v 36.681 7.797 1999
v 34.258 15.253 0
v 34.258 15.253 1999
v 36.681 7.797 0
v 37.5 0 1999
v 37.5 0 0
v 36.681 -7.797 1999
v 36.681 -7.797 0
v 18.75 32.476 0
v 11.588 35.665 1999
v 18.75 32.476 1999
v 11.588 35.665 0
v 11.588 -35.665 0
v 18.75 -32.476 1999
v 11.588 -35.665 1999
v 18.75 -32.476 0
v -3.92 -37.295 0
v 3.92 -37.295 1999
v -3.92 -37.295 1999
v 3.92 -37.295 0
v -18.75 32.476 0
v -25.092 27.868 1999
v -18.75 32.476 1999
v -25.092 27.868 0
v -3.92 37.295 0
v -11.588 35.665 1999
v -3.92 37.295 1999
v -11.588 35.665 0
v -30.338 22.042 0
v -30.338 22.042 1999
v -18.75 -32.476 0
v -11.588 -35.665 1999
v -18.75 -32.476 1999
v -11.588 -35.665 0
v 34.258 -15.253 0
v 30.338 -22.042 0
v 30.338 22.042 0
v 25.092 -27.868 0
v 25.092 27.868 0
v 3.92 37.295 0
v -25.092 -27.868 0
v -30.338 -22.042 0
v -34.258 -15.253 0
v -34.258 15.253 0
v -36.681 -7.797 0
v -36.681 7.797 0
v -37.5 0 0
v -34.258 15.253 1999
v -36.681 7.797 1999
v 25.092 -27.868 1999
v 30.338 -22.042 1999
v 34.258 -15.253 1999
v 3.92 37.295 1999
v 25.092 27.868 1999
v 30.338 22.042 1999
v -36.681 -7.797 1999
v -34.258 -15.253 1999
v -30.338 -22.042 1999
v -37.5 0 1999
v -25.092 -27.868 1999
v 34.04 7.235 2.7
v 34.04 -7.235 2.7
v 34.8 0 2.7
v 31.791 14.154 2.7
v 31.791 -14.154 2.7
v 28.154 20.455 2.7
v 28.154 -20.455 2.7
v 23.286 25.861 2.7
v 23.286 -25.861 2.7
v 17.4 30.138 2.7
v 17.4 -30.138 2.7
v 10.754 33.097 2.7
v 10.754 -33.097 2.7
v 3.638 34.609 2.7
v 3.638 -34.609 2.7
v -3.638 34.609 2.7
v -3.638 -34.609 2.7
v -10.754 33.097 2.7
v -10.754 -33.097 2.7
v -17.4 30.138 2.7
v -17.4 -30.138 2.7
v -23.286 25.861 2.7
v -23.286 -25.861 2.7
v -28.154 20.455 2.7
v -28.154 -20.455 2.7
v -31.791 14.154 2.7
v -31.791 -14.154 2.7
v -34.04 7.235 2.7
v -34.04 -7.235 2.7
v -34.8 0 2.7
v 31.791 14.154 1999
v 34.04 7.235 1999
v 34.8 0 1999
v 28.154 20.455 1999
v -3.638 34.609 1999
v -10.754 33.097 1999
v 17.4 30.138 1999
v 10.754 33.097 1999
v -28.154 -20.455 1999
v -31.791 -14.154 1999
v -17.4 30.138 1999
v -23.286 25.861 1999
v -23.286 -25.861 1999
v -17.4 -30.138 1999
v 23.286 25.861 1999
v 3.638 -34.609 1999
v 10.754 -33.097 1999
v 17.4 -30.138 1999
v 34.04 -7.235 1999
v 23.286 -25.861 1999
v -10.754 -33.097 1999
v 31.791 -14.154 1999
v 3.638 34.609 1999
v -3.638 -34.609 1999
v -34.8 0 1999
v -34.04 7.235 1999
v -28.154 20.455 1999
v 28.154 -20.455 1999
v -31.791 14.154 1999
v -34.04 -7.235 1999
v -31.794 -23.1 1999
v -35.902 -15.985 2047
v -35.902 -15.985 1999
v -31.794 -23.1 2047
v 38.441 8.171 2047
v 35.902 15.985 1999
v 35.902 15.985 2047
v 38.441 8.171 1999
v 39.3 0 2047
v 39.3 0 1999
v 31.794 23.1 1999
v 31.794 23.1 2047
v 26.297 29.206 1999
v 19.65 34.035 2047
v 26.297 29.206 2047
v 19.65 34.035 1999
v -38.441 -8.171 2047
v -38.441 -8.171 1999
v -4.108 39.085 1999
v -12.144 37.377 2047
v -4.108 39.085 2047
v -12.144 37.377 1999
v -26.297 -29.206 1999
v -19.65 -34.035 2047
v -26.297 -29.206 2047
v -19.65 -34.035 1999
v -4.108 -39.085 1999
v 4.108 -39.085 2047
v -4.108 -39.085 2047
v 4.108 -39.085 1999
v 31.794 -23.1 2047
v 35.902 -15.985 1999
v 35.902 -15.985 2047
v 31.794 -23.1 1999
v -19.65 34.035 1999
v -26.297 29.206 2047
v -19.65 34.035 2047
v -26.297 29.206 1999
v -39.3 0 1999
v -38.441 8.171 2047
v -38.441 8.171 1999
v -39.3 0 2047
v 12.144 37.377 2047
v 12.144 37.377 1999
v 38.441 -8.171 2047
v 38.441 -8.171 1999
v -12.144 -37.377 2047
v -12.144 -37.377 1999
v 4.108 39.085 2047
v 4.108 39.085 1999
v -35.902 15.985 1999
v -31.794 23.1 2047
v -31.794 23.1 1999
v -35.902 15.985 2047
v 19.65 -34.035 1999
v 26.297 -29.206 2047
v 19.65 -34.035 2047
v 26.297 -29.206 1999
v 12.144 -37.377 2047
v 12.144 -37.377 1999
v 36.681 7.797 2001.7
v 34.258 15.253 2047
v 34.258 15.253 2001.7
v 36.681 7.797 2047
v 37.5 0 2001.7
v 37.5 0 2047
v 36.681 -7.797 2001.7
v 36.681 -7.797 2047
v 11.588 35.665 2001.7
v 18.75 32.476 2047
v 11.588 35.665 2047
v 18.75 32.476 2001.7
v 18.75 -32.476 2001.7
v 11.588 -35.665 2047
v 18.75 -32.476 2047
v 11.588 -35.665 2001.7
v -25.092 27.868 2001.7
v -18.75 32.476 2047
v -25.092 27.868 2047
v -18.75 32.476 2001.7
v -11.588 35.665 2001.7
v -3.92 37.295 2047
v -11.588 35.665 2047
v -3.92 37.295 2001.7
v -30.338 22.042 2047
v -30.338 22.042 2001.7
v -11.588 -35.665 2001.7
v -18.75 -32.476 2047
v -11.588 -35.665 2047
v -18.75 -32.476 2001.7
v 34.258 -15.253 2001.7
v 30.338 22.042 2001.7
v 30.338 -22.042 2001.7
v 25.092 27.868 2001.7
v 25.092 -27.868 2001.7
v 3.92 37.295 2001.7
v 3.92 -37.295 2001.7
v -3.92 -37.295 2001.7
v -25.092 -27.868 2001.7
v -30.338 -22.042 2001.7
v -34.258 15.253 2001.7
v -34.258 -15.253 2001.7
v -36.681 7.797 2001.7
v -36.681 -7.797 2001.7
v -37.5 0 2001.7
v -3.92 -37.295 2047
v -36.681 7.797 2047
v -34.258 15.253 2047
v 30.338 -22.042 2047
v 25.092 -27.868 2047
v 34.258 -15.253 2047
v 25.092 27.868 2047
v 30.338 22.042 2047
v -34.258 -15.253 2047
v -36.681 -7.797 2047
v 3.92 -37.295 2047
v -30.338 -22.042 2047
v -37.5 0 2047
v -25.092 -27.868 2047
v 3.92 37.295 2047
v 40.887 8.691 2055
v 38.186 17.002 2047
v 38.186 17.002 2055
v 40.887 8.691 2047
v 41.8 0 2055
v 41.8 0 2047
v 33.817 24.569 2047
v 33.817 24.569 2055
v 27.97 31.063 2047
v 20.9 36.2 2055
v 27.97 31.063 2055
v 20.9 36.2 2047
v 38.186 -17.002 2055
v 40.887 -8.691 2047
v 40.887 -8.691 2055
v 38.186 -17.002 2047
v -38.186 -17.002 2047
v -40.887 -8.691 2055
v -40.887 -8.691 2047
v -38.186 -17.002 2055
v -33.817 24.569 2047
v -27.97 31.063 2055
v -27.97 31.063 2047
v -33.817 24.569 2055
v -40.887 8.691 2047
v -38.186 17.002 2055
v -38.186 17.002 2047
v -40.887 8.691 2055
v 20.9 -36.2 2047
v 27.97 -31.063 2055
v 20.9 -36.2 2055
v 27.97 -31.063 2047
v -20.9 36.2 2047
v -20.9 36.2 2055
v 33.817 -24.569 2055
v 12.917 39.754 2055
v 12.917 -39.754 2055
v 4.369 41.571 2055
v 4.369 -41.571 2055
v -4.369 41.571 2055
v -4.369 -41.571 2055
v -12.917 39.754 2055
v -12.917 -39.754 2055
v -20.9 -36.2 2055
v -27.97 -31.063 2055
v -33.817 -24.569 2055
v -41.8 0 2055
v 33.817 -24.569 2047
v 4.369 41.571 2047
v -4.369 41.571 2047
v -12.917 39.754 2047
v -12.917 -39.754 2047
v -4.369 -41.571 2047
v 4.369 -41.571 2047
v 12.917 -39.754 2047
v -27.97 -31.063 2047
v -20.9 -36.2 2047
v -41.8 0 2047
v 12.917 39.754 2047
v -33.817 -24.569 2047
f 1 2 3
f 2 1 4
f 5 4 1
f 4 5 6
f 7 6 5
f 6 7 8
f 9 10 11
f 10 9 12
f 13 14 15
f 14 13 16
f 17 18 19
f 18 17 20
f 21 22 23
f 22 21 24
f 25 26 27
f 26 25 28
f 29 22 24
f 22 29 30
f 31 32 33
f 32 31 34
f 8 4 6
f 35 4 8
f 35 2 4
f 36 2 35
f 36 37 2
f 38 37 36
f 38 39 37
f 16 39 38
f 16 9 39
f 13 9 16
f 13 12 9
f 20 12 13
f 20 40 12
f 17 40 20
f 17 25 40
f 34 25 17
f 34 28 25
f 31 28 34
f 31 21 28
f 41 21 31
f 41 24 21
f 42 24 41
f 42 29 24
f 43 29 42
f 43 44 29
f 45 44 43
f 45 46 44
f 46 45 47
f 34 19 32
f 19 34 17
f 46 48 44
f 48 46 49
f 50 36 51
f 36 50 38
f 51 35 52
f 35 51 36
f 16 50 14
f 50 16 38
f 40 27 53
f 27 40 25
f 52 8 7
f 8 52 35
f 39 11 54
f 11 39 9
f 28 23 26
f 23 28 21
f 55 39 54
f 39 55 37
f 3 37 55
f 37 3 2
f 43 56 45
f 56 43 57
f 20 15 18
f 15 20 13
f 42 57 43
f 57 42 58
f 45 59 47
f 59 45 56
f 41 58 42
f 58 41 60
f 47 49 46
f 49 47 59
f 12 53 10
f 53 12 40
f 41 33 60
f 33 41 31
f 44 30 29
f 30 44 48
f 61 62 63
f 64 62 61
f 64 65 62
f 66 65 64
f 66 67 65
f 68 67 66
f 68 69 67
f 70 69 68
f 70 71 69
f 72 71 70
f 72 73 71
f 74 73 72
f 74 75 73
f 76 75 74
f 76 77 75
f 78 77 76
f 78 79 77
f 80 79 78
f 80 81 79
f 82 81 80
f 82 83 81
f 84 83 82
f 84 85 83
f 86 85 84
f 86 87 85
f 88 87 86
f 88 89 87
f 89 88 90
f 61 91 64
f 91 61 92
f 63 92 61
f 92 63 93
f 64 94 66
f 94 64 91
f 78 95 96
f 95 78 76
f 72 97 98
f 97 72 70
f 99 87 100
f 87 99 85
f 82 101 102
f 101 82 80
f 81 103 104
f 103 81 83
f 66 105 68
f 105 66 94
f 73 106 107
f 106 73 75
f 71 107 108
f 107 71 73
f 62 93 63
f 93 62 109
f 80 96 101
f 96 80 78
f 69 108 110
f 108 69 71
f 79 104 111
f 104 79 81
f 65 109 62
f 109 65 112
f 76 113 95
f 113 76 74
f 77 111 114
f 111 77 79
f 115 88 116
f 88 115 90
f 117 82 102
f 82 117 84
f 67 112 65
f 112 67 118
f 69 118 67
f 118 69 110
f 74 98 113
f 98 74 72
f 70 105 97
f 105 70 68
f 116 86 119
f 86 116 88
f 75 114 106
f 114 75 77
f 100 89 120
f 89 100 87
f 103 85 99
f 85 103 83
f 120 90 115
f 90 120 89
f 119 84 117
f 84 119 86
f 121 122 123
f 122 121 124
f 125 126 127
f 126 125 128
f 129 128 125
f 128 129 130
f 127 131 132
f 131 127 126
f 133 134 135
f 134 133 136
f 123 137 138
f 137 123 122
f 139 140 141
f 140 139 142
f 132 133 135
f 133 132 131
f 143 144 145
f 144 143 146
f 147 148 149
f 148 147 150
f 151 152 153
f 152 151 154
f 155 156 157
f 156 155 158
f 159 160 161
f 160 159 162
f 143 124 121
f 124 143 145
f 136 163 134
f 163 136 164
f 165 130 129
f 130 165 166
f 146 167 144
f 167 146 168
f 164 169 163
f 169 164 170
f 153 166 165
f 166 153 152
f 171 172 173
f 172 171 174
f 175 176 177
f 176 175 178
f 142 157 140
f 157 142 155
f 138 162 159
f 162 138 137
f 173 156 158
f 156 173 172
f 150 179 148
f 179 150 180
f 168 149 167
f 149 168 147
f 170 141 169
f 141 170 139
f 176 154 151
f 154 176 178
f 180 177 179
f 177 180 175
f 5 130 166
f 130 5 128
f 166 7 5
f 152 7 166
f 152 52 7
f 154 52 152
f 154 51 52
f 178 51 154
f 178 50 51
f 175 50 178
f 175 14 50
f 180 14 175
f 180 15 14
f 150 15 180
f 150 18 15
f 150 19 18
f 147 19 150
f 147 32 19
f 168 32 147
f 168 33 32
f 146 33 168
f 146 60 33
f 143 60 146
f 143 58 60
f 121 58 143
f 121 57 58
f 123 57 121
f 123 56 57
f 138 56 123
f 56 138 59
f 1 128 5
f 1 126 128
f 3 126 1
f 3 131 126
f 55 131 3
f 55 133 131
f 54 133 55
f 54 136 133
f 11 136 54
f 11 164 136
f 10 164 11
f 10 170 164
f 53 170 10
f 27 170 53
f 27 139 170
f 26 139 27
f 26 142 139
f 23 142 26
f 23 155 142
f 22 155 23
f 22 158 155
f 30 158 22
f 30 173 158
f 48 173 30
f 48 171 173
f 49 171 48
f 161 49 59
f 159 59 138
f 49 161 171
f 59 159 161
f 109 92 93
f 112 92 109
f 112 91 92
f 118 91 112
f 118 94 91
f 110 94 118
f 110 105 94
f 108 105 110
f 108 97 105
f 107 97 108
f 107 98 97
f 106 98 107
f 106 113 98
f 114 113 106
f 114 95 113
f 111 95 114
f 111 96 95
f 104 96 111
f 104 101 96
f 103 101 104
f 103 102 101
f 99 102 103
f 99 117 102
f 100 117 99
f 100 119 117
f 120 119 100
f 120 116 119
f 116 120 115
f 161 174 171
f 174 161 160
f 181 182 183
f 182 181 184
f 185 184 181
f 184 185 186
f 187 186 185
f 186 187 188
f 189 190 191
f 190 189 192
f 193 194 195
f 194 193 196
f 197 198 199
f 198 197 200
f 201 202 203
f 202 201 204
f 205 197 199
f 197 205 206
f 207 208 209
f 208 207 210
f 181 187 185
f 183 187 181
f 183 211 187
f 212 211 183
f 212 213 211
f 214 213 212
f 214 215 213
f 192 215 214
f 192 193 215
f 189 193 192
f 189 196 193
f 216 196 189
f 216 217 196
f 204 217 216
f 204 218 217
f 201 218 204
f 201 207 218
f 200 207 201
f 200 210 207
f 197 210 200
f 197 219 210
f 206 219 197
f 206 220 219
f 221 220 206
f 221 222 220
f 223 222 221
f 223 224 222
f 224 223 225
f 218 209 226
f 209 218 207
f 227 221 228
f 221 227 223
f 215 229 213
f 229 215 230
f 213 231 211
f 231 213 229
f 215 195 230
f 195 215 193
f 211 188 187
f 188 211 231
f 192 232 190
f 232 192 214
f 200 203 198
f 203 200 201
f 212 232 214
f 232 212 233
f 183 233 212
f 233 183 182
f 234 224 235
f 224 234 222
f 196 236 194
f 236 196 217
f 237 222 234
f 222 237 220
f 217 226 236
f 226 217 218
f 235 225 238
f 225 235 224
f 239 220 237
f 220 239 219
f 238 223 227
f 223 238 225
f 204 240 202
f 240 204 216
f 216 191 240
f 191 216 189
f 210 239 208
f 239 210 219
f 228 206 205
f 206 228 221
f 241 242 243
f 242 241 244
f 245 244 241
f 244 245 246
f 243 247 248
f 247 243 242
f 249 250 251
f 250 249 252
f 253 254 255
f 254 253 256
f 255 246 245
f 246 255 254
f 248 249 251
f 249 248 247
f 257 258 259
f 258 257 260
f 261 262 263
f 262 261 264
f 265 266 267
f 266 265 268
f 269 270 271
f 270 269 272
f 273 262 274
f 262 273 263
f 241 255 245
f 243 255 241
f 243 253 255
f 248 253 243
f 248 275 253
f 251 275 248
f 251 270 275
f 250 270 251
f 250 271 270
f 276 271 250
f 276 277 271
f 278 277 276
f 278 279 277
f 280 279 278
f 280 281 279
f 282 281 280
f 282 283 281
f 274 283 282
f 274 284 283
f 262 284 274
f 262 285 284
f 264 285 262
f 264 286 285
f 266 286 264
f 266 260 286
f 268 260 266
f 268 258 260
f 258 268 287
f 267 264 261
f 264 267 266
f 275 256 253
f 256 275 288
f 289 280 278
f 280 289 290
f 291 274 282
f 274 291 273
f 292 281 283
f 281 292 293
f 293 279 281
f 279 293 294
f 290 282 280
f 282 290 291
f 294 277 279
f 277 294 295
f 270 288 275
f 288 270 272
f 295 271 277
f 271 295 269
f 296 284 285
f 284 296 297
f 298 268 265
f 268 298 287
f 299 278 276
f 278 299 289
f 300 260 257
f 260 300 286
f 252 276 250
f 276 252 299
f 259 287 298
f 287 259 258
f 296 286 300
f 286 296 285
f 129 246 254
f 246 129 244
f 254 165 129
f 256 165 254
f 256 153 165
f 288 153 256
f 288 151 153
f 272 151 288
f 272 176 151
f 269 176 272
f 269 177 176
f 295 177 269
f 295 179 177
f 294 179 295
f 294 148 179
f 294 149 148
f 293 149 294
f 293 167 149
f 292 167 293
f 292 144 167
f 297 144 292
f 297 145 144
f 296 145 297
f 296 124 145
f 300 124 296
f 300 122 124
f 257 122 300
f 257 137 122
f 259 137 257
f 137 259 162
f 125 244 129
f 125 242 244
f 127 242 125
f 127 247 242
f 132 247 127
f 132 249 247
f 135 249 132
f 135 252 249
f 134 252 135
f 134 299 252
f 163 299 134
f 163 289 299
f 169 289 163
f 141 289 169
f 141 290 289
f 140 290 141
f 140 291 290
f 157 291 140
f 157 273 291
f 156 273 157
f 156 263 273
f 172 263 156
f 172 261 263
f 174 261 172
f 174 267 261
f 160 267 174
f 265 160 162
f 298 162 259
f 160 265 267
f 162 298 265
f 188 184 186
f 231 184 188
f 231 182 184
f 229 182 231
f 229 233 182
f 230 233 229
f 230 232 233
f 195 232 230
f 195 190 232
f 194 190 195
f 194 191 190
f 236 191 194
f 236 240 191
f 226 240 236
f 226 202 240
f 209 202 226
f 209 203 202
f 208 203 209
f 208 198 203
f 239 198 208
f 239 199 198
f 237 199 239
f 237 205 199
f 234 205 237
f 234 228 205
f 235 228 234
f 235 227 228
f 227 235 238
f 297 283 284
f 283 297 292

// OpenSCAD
// Parameters
nominal_diameter_mm = 75; //[40:160:1]
length_mm = 2000; //[500:4000:10]
pipe_od_mm = 75; //[40:160:1]
wall_thickness_mm = 2.7; //[1.5:6:0.1]
fit_socket_length_mm = 55; //[25:120:1]
fit_socket_wall_extra_mm = 1.8; //[0.8:4:0.1]
fit_stop_ring_length_mm = 8; //[3:20:1]
fit_stop_ring_radial_mm = 2.5; //[1:6:0.1]
fit_lead_in_length_mm = 6; //[2:20:1]
overlap_mm = 1; //[0.5:2:0.1]
include_end_fitting = 1; //[0:1:1]

// HT Pipe - complete geometry
module ht_pipe() {
  color([0.85, 0.85, 0.8]) {
    // Pipe body
    difference() {
      cylinder(h=length_mm, r=pipe_od_mm/2, center=false);
      translate([0, 0, wall_thickness_mm])
        cylinder(h=length_mm, r=pipe_od_mm/2 - wall_thickness_mm, center=false);
    }
    
    // End fitting
    if (include_end_fitting) {
      union() {
        // Socket shell
        difference() {
          translate([0, 0, length_mm - overlap_mm])
            cylinder(h=fit_socket_length_mm, r=pipe_od_mm/2 + fit_socket_wall_extra_mm, center=false);
          translate([0, 0, length_mm - overlap_mm + wall_thickness_mm])
            cylinder(h=fit_socket_length_mm, r=pipe_od_mm/2, center=false);
        }
        
        // Stop ring
        translate([0, 0, length_mm + fit_socket_length_mm - fit_stop_ring_length_mm])
          cylinder(h=fit_stop_ring_length_mm, r=pipe_od_mm/2 + fit_socket_wall_extra_mm + fit_stop_ring_radial_mm, center=false);
        
        // Lead-in cone
        translate([0, 0, length_mm + fit_socket_length_mm - fit_lead_in_length_mm])
          cylinder(h=fit_lead_in_length_mm, r1=pipe_od_mm/2 + fit_socket_wall_extra_mm, r2=pipe_od_mm/2 + fit_socket_wall_extra_mm + fit_stop_ring_radial_mm, center=false);
      }
    }
  }
}

// Assembly
module assembly() {
  ht_pipe();
}

assembly();
